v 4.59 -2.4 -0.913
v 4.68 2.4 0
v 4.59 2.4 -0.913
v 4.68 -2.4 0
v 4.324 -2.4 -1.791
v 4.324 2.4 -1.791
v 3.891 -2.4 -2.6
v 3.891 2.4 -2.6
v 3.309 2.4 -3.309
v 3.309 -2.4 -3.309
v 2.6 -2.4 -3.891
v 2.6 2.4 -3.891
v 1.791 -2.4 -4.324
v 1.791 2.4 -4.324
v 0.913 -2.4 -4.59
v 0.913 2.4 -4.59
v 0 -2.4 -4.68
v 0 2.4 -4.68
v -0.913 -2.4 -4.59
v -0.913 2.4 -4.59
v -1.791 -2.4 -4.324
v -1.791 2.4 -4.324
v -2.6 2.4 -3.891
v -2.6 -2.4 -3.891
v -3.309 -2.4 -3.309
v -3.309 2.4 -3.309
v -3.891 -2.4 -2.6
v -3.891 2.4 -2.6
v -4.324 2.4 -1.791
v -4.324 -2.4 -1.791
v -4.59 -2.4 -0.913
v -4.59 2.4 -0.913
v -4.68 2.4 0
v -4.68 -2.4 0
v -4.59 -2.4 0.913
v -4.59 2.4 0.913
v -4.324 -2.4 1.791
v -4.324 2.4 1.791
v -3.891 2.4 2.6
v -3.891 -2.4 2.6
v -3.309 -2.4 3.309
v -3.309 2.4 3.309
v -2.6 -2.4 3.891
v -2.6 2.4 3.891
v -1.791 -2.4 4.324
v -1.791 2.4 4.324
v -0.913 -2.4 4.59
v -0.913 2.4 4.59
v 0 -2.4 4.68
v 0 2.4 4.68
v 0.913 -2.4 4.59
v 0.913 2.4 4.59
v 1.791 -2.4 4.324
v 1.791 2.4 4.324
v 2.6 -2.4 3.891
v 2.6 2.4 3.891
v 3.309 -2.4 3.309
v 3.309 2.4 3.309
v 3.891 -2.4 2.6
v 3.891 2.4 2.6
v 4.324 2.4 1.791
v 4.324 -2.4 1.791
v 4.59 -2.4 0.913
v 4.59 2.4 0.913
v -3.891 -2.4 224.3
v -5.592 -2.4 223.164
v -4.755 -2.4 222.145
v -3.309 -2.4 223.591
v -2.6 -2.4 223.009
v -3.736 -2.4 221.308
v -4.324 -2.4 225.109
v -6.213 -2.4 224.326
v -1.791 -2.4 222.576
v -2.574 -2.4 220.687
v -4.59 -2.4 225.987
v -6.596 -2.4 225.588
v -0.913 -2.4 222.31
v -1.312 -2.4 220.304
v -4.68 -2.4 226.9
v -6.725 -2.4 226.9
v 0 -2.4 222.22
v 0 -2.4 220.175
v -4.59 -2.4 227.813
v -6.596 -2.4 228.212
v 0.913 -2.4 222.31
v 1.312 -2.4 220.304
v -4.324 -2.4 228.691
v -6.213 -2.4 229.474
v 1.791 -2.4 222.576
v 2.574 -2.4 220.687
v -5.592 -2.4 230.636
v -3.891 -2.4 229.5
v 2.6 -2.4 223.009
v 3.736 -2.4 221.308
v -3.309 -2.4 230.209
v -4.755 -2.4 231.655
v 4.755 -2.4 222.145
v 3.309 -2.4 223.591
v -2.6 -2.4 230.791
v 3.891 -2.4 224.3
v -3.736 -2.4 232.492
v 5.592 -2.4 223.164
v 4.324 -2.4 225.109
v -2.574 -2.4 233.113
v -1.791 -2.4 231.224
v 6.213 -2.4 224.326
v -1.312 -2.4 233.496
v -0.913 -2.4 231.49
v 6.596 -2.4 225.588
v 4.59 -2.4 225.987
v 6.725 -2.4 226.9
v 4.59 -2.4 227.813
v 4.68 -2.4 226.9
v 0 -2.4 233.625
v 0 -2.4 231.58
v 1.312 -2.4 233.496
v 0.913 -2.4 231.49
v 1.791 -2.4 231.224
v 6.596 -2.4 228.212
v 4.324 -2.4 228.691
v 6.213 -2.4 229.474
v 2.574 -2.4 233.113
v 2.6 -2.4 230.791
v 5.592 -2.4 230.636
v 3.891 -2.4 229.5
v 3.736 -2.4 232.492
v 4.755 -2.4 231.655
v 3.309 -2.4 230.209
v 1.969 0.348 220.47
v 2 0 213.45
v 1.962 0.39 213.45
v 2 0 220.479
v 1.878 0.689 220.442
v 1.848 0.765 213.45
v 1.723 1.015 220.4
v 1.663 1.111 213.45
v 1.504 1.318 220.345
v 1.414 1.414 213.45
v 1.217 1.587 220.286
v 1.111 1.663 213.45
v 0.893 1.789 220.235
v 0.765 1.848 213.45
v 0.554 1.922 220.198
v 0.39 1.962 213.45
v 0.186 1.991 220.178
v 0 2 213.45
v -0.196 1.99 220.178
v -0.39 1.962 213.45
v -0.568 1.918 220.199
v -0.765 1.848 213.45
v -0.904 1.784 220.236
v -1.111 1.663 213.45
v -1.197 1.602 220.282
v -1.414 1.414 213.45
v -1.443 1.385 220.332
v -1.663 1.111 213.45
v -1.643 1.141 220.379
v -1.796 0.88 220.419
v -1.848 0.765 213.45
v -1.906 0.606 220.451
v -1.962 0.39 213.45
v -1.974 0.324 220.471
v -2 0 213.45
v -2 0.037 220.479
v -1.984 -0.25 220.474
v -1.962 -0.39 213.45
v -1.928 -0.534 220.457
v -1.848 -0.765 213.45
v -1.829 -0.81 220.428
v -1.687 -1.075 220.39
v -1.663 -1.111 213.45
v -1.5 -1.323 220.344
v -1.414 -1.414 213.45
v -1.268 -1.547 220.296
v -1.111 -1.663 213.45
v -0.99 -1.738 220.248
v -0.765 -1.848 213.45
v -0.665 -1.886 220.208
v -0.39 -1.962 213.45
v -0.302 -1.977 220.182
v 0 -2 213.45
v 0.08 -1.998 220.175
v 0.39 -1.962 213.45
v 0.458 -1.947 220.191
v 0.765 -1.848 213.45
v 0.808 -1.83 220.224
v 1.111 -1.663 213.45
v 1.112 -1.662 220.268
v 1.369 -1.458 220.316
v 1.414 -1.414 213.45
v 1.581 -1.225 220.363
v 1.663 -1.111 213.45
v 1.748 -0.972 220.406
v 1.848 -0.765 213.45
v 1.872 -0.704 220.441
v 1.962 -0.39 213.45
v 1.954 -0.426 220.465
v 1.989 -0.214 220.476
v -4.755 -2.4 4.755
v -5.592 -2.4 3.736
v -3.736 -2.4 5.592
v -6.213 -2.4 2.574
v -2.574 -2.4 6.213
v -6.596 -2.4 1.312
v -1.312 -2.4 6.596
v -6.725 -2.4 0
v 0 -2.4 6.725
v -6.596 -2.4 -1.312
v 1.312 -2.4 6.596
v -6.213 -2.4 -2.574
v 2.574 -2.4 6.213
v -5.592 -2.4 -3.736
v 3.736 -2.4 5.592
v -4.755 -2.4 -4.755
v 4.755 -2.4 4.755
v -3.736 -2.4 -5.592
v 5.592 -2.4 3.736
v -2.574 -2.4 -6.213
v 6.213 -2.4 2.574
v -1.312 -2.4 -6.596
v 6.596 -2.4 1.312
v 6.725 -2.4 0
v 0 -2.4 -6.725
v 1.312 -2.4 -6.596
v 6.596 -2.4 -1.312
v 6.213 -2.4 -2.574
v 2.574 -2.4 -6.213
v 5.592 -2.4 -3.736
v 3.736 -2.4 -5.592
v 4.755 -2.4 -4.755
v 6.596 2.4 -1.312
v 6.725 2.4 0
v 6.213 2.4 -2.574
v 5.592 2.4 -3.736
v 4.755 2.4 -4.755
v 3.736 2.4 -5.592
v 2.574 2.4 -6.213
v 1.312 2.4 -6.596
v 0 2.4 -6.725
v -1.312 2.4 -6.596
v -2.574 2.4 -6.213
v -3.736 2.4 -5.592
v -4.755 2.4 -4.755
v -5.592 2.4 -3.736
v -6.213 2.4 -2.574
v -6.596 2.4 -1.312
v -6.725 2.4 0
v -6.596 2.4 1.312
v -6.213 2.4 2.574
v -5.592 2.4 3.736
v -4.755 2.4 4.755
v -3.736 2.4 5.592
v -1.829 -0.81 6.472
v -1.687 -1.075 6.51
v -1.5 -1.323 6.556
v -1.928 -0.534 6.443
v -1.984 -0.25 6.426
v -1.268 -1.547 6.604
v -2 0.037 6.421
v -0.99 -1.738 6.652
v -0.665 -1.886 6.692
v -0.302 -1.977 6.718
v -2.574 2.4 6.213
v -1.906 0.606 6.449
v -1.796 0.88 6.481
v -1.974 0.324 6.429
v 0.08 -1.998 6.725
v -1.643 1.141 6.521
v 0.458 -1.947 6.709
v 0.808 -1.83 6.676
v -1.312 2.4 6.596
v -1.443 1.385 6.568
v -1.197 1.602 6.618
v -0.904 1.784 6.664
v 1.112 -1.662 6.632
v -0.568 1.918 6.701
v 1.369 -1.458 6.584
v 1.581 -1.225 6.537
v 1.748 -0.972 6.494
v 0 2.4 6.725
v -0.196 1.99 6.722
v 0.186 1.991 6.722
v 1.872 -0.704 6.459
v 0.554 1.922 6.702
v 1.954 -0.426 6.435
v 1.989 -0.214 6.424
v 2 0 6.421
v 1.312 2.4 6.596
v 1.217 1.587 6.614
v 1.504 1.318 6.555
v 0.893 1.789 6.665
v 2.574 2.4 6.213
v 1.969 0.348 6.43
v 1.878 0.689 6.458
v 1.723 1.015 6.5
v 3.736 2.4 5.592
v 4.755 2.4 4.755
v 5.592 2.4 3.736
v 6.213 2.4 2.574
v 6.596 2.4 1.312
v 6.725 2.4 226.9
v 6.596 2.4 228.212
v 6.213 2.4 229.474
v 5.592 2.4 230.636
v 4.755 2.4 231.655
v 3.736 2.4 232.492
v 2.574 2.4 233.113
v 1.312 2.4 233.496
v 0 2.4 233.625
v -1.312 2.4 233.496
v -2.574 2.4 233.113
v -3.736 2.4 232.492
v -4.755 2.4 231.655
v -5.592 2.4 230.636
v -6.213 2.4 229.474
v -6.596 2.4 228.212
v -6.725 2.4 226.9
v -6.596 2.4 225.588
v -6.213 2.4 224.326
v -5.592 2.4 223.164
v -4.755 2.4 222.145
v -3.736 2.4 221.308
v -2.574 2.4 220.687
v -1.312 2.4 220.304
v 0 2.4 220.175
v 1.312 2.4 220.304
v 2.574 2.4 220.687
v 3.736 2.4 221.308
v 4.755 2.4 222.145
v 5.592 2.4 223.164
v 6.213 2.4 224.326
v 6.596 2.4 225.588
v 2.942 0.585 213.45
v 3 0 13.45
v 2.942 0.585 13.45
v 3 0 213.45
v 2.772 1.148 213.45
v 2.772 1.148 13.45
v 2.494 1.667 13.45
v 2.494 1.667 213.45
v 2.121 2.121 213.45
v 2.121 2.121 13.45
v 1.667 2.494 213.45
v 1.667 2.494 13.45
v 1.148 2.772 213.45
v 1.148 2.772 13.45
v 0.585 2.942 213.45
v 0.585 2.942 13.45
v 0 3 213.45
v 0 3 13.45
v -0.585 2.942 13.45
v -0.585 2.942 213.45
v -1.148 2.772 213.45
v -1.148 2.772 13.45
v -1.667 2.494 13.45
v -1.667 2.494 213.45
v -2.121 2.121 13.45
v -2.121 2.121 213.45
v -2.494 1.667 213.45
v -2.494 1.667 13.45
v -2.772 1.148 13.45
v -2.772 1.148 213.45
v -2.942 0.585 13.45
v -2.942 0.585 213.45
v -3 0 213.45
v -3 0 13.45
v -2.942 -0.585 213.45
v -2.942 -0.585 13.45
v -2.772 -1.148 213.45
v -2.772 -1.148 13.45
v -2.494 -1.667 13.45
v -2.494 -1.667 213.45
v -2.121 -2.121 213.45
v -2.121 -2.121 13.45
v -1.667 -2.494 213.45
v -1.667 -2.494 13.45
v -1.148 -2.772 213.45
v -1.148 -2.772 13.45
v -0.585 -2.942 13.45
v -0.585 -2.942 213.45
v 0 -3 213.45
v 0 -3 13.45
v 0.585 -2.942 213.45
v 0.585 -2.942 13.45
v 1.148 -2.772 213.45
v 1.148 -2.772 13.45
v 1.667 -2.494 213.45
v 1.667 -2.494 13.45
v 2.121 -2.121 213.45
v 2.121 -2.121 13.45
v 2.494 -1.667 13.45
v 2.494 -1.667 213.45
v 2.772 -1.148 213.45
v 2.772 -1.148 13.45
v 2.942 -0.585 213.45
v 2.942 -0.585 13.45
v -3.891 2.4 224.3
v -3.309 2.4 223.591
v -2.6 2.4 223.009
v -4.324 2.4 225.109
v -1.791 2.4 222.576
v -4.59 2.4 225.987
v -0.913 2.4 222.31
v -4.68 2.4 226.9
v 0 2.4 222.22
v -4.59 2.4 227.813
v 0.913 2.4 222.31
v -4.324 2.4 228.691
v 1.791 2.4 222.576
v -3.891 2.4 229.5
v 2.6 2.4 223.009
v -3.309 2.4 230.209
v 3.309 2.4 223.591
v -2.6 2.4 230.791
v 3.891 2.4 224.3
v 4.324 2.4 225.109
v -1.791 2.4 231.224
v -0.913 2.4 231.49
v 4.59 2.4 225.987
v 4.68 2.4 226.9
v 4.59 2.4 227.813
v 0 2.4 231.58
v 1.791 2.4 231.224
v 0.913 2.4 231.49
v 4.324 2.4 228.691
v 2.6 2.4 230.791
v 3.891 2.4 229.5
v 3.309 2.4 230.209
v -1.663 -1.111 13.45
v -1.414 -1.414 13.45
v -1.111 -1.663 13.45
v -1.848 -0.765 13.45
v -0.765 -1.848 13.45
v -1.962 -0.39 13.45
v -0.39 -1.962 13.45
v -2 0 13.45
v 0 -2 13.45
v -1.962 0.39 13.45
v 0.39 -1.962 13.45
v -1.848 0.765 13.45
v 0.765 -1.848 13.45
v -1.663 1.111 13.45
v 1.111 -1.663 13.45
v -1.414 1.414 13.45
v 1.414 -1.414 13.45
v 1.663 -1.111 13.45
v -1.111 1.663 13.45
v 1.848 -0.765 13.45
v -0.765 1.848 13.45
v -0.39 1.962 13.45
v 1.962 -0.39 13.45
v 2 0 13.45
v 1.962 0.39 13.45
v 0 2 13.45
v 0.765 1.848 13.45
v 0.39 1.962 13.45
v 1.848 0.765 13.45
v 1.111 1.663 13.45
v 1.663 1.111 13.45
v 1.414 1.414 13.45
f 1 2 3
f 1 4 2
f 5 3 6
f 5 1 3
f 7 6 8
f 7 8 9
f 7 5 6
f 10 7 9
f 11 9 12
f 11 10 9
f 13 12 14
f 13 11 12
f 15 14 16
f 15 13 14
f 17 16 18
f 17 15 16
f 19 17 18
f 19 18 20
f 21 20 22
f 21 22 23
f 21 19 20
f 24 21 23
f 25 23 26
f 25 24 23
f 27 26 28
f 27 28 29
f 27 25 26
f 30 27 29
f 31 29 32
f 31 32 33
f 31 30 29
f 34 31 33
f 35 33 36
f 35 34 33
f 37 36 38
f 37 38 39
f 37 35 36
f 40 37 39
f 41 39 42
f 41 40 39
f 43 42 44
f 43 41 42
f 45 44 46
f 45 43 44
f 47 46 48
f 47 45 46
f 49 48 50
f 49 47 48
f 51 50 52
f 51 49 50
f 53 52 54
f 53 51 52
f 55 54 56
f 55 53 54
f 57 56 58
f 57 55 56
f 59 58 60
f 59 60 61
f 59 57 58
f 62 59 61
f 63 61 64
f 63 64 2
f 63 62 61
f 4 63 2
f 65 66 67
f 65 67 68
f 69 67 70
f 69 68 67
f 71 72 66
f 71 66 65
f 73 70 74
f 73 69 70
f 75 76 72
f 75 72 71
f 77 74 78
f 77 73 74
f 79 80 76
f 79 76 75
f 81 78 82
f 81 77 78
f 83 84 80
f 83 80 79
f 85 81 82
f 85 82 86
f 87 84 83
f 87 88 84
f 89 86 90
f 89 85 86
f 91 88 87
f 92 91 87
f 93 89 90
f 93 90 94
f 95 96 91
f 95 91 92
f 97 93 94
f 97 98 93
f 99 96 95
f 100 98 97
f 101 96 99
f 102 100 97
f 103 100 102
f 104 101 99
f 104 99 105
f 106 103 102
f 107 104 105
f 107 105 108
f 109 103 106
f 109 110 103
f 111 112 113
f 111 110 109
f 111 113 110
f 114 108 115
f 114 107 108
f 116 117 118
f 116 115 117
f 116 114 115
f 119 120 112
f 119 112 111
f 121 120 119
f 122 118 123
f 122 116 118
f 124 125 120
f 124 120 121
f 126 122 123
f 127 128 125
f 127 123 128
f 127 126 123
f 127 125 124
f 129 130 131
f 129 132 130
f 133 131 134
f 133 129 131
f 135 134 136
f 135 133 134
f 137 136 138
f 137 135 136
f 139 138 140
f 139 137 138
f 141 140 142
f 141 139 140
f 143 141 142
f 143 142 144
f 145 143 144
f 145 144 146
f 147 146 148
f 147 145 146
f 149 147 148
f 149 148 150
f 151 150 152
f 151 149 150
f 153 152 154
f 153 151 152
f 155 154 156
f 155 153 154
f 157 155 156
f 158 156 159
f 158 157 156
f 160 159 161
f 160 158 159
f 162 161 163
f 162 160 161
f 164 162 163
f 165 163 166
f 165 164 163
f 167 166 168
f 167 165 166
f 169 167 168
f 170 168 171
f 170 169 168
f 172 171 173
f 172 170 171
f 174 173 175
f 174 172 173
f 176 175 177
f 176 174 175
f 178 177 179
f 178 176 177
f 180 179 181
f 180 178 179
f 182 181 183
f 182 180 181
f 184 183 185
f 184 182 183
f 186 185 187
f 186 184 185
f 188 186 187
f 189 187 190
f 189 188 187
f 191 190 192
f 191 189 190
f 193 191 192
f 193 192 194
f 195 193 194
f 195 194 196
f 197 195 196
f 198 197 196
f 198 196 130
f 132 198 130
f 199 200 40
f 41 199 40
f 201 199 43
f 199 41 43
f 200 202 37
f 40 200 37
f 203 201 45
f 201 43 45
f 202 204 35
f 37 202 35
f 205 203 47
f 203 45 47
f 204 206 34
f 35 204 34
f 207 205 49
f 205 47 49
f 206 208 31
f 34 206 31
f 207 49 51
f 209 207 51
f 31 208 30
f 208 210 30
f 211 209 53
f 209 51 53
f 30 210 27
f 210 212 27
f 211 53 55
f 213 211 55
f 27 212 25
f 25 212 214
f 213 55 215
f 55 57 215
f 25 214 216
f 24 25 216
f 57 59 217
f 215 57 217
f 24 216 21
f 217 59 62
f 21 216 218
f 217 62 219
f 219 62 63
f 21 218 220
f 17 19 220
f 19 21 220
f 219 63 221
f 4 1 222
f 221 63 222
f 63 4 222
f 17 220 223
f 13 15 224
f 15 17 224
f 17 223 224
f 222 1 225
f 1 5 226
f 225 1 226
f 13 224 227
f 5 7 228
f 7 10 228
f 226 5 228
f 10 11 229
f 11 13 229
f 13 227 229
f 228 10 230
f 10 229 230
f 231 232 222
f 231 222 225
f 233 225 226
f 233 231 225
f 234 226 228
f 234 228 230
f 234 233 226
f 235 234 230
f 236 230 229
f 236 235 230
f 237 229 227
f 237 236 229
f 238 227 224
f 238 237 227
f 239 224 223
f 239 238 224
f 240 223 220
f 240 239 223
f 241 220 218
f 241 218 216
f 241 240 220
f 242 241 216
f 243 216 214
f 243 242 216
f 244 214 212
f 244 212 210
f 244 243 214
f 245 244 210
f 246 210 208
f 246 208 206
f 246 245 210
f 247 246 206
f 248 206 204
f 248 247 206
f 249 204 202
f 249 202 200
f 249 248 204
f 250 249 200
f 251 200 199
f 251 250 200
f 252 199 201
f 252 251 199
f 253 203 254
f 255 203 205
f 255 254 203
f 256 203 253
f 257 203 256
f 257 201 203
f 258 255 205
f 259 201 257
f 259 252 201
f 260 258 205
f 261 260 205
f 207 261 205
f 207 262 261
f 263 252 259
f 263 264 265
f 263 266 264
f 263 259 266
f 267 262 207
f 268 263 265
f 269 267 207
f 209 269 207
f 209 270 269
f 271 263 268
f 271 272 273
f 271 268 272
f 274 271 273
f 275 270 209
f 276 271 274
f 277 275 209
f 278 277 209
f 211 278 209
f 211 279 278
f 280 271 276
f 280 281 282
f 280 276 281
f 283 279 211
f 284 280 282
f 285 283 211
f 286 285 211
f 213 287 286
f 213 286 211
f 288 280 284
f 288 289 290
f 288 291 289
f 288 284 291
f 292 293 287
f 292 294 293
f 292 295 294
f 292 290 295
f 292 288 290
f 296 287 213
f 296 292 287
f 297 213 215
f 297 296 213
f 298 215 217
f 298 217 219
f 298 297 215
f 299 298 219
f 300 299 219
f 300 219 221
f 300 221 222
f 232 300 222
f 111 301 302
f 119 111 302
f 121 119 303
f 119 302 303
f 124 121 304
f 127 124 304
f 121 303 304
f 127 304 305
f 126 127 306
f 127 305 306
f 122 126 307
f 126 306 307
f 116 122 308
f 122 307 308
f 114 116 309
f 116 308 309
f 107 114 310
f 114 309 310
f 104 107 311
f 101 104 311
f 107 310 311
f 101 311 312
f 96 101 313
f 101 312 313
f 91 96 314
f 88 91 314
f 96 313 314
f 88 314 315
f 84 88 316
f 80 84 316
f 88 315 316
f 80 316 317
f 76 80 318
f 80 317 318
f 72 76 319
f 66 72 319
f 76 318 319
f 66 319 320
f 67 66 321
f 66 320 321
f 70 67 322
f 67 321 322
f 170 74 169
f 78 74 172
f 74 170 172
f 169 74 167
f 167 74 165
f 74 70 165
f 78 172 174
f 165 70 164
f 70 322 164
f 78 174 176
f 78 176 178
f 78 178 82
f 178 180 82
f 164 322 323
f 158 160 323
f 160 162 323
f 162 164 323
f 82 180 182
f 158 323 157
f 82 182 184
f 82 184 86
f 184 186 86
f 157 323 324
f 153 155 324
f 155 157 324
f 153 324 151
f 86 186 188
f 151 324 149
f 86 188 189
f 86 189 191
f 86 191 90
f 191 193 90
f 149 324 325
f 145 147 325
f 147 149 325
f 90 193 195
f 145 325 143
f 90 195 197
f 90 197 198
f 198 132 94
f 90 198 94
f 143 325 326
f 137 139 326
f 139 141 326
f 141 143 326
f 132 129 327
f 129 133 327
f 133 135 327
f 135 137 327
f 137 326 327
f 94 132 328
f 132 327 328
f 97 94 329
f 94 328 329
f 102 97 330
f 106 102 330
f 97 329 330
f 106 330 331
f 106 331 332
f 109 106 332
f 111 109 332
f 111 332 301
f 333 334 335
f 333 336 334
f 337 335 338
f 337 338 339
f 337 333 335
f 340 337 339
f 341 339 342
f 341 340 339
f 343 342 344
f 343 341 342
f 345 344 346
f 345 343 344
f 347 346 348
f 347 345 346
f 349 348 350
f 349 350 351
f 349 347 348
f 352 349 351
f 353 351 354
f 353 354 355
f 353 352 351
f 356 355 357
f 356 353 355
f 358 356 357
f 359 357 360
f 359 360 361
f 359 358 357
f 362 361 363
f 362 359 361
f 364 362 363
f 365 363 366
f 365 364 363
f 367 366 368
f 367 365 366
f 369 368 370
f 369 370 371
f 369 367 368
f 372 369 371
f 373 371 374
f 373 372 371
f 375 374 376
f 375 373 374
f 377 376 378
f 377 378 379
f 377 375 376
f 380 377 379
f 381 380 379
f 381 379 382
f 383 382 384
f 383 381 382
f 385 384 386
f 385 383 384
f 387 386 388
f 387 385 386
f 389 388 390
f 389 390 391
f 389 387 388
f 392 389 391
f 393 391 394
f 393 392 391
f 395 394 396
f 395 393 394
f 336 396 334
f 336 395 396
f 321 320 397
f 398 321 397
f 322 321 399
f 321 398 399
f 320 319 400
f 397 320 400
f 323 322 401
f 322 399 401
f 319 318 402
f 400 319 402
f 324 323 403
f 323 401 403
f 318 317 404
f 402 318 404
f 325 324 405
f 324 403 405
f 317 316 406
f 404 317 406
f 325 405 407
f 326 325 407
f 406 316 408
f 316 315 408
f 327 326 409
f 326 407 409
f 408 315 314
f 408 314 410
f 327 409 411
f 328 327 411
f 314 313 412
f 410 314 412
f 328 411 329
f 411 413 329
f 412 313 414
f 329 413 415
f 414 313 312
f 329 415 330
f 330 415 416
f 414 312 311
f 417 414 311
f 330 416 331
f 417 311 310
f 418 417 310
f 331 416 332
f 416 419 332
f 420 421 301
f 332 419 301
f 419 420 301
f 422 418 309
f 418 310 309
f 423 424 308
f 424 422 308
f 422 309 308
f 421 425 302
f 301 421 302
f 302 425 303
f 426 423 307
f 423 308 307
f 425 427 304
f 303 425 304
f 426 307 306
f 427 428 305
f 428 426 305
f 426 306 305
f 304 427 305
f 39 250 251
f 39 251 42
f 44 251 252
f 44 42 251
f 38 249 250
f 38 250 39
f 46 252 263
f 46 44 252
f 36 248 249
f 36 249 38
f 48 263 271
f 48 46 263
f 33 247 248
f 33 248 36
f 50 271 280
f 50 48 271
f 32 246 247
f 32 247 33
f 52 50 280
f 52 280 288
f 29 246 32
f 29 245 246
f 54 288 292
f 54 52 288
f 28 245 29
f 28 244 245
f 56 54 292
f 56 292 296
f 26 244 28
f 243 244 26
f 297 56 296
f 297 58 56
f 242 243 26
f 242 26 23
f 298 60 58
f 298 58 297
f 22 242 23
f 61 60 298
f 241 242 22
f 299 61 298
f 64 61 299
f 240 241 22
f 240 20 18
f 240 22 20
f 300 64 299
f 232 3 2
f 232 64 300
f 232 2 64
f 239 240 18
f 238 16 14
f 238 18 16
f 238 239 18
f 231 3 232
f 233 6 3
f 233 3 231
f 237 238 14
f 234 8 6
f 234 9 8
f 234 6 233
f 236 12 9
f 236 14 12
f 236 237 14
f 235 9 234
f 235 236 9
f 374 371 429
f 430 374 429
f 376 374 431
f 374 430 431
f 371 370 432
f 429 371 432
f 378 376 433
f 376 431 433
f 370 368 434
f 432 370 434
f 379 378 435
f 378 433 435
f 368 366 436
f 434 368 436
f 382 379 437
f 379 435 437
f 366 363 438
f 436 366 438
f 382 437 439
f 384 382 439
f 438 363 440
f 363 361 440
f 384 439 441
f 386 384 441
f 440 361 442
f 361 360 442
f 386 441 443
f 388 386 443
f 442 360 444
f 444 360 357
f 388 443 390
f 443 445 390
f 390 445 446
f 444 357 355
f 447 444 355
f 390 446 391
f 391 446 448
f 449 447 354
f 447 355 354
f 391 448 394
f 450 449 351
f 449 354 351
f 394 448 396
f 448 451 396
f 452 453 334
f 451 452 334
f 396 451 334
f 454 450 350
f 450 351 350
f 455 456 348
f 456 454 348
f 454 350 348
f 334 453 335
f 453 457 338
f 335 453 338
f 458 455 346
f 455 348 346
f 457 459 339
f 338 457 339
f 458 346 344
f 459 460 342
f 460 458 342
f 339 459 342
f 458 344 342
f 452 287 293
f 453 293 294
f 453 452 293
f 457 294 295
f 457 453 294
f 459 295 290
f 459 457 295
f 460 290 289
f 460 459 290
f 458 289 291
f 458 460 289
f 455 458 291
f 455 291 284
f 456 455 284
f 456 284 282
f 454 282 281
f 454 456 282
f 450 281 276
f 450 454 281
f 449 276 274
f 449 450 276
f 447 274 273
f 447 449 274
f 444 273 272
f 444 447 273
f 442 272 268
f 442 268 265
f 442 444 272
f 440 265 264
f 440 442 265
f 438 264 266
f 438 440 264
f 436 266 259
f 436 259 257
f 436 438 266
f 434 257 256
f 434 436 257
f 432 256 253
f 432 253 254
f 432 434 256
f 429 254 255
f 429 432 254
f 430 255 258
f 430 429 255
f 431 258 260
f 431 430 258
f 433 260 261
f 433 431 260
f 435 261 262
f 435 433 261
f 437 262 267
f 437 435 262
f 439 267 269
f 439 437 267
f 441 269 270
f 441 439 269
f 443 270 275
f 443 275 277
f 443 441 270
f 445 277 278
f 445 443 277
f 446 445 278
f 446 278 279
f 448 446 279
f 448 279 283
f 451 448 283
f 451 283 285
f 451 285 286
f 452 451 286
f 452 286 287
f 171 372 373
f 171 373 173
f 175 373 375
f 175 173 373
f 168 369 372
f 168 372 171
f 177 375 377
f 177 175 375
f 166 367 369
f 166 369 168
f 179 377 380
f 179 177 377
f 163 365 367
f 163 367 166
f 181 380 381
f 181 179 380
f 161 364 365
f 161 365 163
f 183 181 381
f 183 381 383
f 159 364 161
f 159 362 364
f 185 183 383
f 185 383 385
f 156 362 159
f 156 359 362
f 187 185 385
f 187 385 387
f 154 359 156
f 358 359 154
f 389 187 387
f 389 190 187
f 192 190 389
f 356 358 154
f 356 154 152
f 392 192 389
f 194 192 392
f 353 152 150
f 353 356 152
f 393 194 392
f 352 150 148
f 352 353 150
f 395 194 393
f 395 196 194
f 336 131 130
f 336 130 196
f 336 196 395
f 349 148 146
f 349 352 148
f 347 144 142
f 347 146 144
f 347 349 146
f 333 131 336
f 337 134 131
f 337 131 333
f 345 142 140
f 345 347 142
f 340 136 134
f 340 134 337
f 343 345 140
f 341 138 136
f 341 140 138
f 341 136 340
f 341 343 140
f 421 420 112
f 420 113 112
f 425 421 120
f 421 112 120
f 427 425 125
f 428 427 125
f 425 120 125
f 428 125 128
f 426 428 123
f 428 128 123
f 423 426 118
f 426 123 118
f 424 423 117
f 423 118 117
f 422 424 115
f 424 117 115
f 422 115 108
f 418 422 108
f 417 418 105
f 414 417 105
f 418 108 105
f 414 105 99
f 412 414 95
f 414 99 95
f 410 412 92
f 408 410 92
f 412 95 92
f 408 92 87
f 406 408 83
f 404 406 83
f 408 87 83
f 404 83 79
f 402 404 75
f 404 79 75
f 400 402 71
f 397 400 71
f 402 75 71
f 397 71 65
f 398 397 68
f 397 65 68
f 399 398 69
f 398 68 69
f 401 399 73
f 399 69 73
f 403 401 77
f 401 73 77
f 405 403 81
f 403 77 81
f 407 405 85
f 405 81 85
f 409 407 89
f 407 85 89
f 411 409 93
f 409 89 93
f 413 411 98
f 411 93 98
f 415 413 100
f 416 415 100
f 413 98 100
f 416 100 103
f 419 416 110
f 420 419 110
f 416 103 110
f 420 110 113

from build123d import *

# Parameters (mm, degrees)
SKETCH_1_R      = 6.725
SKETCH_1_R_2    = 4.68
EXTRUDE_1_DEPTH = 2.4
SKETCH_2_R      = 2
EXTRUDE_2_DEPTH = 107.5
SKETCH_4_R      = 3
EXTRUDE_3_DEPTH = 100


with BuildPart() as part:
    # 스케치1 → 보스-돌출1 (new body, symmetric)
    with BuildSketch(Plane(origin=(0, 0, 0), x_dir=(1, 0, 0), z_dir=(0, 1, 0))):
        Circle(SKETCH_1_R)
        Circle(SKETCH_1_R_2, mode=Mode.SUBTRACT)
    extrude_1 = extrude(amount=EXTRUDE_1_DEPTH, both=True)

    # 스케치2 → 보스-돌출2 (add, symmetric)
    with BuildSketch(Plane.XY.offset(113.45)):
        Circle(SKETCH_2_R)
    extrude(amount=EXTRUDE_2_DEPTH, both=True)

    # 대칭 복사5: 보스-돌출1 across plane
    add(extrude_1.mirror(Plane.XY.offset(113.45)))

    # 스케치4 → 보스-돌출3 (add, symmetric)
    with BuildSketch(Plane.XY.offset(113.45)):
        Circle(SKETCH_4_R)
    extrude(amount=EXTRUDE_3_DEPTH, both=True)


solid = part.part
